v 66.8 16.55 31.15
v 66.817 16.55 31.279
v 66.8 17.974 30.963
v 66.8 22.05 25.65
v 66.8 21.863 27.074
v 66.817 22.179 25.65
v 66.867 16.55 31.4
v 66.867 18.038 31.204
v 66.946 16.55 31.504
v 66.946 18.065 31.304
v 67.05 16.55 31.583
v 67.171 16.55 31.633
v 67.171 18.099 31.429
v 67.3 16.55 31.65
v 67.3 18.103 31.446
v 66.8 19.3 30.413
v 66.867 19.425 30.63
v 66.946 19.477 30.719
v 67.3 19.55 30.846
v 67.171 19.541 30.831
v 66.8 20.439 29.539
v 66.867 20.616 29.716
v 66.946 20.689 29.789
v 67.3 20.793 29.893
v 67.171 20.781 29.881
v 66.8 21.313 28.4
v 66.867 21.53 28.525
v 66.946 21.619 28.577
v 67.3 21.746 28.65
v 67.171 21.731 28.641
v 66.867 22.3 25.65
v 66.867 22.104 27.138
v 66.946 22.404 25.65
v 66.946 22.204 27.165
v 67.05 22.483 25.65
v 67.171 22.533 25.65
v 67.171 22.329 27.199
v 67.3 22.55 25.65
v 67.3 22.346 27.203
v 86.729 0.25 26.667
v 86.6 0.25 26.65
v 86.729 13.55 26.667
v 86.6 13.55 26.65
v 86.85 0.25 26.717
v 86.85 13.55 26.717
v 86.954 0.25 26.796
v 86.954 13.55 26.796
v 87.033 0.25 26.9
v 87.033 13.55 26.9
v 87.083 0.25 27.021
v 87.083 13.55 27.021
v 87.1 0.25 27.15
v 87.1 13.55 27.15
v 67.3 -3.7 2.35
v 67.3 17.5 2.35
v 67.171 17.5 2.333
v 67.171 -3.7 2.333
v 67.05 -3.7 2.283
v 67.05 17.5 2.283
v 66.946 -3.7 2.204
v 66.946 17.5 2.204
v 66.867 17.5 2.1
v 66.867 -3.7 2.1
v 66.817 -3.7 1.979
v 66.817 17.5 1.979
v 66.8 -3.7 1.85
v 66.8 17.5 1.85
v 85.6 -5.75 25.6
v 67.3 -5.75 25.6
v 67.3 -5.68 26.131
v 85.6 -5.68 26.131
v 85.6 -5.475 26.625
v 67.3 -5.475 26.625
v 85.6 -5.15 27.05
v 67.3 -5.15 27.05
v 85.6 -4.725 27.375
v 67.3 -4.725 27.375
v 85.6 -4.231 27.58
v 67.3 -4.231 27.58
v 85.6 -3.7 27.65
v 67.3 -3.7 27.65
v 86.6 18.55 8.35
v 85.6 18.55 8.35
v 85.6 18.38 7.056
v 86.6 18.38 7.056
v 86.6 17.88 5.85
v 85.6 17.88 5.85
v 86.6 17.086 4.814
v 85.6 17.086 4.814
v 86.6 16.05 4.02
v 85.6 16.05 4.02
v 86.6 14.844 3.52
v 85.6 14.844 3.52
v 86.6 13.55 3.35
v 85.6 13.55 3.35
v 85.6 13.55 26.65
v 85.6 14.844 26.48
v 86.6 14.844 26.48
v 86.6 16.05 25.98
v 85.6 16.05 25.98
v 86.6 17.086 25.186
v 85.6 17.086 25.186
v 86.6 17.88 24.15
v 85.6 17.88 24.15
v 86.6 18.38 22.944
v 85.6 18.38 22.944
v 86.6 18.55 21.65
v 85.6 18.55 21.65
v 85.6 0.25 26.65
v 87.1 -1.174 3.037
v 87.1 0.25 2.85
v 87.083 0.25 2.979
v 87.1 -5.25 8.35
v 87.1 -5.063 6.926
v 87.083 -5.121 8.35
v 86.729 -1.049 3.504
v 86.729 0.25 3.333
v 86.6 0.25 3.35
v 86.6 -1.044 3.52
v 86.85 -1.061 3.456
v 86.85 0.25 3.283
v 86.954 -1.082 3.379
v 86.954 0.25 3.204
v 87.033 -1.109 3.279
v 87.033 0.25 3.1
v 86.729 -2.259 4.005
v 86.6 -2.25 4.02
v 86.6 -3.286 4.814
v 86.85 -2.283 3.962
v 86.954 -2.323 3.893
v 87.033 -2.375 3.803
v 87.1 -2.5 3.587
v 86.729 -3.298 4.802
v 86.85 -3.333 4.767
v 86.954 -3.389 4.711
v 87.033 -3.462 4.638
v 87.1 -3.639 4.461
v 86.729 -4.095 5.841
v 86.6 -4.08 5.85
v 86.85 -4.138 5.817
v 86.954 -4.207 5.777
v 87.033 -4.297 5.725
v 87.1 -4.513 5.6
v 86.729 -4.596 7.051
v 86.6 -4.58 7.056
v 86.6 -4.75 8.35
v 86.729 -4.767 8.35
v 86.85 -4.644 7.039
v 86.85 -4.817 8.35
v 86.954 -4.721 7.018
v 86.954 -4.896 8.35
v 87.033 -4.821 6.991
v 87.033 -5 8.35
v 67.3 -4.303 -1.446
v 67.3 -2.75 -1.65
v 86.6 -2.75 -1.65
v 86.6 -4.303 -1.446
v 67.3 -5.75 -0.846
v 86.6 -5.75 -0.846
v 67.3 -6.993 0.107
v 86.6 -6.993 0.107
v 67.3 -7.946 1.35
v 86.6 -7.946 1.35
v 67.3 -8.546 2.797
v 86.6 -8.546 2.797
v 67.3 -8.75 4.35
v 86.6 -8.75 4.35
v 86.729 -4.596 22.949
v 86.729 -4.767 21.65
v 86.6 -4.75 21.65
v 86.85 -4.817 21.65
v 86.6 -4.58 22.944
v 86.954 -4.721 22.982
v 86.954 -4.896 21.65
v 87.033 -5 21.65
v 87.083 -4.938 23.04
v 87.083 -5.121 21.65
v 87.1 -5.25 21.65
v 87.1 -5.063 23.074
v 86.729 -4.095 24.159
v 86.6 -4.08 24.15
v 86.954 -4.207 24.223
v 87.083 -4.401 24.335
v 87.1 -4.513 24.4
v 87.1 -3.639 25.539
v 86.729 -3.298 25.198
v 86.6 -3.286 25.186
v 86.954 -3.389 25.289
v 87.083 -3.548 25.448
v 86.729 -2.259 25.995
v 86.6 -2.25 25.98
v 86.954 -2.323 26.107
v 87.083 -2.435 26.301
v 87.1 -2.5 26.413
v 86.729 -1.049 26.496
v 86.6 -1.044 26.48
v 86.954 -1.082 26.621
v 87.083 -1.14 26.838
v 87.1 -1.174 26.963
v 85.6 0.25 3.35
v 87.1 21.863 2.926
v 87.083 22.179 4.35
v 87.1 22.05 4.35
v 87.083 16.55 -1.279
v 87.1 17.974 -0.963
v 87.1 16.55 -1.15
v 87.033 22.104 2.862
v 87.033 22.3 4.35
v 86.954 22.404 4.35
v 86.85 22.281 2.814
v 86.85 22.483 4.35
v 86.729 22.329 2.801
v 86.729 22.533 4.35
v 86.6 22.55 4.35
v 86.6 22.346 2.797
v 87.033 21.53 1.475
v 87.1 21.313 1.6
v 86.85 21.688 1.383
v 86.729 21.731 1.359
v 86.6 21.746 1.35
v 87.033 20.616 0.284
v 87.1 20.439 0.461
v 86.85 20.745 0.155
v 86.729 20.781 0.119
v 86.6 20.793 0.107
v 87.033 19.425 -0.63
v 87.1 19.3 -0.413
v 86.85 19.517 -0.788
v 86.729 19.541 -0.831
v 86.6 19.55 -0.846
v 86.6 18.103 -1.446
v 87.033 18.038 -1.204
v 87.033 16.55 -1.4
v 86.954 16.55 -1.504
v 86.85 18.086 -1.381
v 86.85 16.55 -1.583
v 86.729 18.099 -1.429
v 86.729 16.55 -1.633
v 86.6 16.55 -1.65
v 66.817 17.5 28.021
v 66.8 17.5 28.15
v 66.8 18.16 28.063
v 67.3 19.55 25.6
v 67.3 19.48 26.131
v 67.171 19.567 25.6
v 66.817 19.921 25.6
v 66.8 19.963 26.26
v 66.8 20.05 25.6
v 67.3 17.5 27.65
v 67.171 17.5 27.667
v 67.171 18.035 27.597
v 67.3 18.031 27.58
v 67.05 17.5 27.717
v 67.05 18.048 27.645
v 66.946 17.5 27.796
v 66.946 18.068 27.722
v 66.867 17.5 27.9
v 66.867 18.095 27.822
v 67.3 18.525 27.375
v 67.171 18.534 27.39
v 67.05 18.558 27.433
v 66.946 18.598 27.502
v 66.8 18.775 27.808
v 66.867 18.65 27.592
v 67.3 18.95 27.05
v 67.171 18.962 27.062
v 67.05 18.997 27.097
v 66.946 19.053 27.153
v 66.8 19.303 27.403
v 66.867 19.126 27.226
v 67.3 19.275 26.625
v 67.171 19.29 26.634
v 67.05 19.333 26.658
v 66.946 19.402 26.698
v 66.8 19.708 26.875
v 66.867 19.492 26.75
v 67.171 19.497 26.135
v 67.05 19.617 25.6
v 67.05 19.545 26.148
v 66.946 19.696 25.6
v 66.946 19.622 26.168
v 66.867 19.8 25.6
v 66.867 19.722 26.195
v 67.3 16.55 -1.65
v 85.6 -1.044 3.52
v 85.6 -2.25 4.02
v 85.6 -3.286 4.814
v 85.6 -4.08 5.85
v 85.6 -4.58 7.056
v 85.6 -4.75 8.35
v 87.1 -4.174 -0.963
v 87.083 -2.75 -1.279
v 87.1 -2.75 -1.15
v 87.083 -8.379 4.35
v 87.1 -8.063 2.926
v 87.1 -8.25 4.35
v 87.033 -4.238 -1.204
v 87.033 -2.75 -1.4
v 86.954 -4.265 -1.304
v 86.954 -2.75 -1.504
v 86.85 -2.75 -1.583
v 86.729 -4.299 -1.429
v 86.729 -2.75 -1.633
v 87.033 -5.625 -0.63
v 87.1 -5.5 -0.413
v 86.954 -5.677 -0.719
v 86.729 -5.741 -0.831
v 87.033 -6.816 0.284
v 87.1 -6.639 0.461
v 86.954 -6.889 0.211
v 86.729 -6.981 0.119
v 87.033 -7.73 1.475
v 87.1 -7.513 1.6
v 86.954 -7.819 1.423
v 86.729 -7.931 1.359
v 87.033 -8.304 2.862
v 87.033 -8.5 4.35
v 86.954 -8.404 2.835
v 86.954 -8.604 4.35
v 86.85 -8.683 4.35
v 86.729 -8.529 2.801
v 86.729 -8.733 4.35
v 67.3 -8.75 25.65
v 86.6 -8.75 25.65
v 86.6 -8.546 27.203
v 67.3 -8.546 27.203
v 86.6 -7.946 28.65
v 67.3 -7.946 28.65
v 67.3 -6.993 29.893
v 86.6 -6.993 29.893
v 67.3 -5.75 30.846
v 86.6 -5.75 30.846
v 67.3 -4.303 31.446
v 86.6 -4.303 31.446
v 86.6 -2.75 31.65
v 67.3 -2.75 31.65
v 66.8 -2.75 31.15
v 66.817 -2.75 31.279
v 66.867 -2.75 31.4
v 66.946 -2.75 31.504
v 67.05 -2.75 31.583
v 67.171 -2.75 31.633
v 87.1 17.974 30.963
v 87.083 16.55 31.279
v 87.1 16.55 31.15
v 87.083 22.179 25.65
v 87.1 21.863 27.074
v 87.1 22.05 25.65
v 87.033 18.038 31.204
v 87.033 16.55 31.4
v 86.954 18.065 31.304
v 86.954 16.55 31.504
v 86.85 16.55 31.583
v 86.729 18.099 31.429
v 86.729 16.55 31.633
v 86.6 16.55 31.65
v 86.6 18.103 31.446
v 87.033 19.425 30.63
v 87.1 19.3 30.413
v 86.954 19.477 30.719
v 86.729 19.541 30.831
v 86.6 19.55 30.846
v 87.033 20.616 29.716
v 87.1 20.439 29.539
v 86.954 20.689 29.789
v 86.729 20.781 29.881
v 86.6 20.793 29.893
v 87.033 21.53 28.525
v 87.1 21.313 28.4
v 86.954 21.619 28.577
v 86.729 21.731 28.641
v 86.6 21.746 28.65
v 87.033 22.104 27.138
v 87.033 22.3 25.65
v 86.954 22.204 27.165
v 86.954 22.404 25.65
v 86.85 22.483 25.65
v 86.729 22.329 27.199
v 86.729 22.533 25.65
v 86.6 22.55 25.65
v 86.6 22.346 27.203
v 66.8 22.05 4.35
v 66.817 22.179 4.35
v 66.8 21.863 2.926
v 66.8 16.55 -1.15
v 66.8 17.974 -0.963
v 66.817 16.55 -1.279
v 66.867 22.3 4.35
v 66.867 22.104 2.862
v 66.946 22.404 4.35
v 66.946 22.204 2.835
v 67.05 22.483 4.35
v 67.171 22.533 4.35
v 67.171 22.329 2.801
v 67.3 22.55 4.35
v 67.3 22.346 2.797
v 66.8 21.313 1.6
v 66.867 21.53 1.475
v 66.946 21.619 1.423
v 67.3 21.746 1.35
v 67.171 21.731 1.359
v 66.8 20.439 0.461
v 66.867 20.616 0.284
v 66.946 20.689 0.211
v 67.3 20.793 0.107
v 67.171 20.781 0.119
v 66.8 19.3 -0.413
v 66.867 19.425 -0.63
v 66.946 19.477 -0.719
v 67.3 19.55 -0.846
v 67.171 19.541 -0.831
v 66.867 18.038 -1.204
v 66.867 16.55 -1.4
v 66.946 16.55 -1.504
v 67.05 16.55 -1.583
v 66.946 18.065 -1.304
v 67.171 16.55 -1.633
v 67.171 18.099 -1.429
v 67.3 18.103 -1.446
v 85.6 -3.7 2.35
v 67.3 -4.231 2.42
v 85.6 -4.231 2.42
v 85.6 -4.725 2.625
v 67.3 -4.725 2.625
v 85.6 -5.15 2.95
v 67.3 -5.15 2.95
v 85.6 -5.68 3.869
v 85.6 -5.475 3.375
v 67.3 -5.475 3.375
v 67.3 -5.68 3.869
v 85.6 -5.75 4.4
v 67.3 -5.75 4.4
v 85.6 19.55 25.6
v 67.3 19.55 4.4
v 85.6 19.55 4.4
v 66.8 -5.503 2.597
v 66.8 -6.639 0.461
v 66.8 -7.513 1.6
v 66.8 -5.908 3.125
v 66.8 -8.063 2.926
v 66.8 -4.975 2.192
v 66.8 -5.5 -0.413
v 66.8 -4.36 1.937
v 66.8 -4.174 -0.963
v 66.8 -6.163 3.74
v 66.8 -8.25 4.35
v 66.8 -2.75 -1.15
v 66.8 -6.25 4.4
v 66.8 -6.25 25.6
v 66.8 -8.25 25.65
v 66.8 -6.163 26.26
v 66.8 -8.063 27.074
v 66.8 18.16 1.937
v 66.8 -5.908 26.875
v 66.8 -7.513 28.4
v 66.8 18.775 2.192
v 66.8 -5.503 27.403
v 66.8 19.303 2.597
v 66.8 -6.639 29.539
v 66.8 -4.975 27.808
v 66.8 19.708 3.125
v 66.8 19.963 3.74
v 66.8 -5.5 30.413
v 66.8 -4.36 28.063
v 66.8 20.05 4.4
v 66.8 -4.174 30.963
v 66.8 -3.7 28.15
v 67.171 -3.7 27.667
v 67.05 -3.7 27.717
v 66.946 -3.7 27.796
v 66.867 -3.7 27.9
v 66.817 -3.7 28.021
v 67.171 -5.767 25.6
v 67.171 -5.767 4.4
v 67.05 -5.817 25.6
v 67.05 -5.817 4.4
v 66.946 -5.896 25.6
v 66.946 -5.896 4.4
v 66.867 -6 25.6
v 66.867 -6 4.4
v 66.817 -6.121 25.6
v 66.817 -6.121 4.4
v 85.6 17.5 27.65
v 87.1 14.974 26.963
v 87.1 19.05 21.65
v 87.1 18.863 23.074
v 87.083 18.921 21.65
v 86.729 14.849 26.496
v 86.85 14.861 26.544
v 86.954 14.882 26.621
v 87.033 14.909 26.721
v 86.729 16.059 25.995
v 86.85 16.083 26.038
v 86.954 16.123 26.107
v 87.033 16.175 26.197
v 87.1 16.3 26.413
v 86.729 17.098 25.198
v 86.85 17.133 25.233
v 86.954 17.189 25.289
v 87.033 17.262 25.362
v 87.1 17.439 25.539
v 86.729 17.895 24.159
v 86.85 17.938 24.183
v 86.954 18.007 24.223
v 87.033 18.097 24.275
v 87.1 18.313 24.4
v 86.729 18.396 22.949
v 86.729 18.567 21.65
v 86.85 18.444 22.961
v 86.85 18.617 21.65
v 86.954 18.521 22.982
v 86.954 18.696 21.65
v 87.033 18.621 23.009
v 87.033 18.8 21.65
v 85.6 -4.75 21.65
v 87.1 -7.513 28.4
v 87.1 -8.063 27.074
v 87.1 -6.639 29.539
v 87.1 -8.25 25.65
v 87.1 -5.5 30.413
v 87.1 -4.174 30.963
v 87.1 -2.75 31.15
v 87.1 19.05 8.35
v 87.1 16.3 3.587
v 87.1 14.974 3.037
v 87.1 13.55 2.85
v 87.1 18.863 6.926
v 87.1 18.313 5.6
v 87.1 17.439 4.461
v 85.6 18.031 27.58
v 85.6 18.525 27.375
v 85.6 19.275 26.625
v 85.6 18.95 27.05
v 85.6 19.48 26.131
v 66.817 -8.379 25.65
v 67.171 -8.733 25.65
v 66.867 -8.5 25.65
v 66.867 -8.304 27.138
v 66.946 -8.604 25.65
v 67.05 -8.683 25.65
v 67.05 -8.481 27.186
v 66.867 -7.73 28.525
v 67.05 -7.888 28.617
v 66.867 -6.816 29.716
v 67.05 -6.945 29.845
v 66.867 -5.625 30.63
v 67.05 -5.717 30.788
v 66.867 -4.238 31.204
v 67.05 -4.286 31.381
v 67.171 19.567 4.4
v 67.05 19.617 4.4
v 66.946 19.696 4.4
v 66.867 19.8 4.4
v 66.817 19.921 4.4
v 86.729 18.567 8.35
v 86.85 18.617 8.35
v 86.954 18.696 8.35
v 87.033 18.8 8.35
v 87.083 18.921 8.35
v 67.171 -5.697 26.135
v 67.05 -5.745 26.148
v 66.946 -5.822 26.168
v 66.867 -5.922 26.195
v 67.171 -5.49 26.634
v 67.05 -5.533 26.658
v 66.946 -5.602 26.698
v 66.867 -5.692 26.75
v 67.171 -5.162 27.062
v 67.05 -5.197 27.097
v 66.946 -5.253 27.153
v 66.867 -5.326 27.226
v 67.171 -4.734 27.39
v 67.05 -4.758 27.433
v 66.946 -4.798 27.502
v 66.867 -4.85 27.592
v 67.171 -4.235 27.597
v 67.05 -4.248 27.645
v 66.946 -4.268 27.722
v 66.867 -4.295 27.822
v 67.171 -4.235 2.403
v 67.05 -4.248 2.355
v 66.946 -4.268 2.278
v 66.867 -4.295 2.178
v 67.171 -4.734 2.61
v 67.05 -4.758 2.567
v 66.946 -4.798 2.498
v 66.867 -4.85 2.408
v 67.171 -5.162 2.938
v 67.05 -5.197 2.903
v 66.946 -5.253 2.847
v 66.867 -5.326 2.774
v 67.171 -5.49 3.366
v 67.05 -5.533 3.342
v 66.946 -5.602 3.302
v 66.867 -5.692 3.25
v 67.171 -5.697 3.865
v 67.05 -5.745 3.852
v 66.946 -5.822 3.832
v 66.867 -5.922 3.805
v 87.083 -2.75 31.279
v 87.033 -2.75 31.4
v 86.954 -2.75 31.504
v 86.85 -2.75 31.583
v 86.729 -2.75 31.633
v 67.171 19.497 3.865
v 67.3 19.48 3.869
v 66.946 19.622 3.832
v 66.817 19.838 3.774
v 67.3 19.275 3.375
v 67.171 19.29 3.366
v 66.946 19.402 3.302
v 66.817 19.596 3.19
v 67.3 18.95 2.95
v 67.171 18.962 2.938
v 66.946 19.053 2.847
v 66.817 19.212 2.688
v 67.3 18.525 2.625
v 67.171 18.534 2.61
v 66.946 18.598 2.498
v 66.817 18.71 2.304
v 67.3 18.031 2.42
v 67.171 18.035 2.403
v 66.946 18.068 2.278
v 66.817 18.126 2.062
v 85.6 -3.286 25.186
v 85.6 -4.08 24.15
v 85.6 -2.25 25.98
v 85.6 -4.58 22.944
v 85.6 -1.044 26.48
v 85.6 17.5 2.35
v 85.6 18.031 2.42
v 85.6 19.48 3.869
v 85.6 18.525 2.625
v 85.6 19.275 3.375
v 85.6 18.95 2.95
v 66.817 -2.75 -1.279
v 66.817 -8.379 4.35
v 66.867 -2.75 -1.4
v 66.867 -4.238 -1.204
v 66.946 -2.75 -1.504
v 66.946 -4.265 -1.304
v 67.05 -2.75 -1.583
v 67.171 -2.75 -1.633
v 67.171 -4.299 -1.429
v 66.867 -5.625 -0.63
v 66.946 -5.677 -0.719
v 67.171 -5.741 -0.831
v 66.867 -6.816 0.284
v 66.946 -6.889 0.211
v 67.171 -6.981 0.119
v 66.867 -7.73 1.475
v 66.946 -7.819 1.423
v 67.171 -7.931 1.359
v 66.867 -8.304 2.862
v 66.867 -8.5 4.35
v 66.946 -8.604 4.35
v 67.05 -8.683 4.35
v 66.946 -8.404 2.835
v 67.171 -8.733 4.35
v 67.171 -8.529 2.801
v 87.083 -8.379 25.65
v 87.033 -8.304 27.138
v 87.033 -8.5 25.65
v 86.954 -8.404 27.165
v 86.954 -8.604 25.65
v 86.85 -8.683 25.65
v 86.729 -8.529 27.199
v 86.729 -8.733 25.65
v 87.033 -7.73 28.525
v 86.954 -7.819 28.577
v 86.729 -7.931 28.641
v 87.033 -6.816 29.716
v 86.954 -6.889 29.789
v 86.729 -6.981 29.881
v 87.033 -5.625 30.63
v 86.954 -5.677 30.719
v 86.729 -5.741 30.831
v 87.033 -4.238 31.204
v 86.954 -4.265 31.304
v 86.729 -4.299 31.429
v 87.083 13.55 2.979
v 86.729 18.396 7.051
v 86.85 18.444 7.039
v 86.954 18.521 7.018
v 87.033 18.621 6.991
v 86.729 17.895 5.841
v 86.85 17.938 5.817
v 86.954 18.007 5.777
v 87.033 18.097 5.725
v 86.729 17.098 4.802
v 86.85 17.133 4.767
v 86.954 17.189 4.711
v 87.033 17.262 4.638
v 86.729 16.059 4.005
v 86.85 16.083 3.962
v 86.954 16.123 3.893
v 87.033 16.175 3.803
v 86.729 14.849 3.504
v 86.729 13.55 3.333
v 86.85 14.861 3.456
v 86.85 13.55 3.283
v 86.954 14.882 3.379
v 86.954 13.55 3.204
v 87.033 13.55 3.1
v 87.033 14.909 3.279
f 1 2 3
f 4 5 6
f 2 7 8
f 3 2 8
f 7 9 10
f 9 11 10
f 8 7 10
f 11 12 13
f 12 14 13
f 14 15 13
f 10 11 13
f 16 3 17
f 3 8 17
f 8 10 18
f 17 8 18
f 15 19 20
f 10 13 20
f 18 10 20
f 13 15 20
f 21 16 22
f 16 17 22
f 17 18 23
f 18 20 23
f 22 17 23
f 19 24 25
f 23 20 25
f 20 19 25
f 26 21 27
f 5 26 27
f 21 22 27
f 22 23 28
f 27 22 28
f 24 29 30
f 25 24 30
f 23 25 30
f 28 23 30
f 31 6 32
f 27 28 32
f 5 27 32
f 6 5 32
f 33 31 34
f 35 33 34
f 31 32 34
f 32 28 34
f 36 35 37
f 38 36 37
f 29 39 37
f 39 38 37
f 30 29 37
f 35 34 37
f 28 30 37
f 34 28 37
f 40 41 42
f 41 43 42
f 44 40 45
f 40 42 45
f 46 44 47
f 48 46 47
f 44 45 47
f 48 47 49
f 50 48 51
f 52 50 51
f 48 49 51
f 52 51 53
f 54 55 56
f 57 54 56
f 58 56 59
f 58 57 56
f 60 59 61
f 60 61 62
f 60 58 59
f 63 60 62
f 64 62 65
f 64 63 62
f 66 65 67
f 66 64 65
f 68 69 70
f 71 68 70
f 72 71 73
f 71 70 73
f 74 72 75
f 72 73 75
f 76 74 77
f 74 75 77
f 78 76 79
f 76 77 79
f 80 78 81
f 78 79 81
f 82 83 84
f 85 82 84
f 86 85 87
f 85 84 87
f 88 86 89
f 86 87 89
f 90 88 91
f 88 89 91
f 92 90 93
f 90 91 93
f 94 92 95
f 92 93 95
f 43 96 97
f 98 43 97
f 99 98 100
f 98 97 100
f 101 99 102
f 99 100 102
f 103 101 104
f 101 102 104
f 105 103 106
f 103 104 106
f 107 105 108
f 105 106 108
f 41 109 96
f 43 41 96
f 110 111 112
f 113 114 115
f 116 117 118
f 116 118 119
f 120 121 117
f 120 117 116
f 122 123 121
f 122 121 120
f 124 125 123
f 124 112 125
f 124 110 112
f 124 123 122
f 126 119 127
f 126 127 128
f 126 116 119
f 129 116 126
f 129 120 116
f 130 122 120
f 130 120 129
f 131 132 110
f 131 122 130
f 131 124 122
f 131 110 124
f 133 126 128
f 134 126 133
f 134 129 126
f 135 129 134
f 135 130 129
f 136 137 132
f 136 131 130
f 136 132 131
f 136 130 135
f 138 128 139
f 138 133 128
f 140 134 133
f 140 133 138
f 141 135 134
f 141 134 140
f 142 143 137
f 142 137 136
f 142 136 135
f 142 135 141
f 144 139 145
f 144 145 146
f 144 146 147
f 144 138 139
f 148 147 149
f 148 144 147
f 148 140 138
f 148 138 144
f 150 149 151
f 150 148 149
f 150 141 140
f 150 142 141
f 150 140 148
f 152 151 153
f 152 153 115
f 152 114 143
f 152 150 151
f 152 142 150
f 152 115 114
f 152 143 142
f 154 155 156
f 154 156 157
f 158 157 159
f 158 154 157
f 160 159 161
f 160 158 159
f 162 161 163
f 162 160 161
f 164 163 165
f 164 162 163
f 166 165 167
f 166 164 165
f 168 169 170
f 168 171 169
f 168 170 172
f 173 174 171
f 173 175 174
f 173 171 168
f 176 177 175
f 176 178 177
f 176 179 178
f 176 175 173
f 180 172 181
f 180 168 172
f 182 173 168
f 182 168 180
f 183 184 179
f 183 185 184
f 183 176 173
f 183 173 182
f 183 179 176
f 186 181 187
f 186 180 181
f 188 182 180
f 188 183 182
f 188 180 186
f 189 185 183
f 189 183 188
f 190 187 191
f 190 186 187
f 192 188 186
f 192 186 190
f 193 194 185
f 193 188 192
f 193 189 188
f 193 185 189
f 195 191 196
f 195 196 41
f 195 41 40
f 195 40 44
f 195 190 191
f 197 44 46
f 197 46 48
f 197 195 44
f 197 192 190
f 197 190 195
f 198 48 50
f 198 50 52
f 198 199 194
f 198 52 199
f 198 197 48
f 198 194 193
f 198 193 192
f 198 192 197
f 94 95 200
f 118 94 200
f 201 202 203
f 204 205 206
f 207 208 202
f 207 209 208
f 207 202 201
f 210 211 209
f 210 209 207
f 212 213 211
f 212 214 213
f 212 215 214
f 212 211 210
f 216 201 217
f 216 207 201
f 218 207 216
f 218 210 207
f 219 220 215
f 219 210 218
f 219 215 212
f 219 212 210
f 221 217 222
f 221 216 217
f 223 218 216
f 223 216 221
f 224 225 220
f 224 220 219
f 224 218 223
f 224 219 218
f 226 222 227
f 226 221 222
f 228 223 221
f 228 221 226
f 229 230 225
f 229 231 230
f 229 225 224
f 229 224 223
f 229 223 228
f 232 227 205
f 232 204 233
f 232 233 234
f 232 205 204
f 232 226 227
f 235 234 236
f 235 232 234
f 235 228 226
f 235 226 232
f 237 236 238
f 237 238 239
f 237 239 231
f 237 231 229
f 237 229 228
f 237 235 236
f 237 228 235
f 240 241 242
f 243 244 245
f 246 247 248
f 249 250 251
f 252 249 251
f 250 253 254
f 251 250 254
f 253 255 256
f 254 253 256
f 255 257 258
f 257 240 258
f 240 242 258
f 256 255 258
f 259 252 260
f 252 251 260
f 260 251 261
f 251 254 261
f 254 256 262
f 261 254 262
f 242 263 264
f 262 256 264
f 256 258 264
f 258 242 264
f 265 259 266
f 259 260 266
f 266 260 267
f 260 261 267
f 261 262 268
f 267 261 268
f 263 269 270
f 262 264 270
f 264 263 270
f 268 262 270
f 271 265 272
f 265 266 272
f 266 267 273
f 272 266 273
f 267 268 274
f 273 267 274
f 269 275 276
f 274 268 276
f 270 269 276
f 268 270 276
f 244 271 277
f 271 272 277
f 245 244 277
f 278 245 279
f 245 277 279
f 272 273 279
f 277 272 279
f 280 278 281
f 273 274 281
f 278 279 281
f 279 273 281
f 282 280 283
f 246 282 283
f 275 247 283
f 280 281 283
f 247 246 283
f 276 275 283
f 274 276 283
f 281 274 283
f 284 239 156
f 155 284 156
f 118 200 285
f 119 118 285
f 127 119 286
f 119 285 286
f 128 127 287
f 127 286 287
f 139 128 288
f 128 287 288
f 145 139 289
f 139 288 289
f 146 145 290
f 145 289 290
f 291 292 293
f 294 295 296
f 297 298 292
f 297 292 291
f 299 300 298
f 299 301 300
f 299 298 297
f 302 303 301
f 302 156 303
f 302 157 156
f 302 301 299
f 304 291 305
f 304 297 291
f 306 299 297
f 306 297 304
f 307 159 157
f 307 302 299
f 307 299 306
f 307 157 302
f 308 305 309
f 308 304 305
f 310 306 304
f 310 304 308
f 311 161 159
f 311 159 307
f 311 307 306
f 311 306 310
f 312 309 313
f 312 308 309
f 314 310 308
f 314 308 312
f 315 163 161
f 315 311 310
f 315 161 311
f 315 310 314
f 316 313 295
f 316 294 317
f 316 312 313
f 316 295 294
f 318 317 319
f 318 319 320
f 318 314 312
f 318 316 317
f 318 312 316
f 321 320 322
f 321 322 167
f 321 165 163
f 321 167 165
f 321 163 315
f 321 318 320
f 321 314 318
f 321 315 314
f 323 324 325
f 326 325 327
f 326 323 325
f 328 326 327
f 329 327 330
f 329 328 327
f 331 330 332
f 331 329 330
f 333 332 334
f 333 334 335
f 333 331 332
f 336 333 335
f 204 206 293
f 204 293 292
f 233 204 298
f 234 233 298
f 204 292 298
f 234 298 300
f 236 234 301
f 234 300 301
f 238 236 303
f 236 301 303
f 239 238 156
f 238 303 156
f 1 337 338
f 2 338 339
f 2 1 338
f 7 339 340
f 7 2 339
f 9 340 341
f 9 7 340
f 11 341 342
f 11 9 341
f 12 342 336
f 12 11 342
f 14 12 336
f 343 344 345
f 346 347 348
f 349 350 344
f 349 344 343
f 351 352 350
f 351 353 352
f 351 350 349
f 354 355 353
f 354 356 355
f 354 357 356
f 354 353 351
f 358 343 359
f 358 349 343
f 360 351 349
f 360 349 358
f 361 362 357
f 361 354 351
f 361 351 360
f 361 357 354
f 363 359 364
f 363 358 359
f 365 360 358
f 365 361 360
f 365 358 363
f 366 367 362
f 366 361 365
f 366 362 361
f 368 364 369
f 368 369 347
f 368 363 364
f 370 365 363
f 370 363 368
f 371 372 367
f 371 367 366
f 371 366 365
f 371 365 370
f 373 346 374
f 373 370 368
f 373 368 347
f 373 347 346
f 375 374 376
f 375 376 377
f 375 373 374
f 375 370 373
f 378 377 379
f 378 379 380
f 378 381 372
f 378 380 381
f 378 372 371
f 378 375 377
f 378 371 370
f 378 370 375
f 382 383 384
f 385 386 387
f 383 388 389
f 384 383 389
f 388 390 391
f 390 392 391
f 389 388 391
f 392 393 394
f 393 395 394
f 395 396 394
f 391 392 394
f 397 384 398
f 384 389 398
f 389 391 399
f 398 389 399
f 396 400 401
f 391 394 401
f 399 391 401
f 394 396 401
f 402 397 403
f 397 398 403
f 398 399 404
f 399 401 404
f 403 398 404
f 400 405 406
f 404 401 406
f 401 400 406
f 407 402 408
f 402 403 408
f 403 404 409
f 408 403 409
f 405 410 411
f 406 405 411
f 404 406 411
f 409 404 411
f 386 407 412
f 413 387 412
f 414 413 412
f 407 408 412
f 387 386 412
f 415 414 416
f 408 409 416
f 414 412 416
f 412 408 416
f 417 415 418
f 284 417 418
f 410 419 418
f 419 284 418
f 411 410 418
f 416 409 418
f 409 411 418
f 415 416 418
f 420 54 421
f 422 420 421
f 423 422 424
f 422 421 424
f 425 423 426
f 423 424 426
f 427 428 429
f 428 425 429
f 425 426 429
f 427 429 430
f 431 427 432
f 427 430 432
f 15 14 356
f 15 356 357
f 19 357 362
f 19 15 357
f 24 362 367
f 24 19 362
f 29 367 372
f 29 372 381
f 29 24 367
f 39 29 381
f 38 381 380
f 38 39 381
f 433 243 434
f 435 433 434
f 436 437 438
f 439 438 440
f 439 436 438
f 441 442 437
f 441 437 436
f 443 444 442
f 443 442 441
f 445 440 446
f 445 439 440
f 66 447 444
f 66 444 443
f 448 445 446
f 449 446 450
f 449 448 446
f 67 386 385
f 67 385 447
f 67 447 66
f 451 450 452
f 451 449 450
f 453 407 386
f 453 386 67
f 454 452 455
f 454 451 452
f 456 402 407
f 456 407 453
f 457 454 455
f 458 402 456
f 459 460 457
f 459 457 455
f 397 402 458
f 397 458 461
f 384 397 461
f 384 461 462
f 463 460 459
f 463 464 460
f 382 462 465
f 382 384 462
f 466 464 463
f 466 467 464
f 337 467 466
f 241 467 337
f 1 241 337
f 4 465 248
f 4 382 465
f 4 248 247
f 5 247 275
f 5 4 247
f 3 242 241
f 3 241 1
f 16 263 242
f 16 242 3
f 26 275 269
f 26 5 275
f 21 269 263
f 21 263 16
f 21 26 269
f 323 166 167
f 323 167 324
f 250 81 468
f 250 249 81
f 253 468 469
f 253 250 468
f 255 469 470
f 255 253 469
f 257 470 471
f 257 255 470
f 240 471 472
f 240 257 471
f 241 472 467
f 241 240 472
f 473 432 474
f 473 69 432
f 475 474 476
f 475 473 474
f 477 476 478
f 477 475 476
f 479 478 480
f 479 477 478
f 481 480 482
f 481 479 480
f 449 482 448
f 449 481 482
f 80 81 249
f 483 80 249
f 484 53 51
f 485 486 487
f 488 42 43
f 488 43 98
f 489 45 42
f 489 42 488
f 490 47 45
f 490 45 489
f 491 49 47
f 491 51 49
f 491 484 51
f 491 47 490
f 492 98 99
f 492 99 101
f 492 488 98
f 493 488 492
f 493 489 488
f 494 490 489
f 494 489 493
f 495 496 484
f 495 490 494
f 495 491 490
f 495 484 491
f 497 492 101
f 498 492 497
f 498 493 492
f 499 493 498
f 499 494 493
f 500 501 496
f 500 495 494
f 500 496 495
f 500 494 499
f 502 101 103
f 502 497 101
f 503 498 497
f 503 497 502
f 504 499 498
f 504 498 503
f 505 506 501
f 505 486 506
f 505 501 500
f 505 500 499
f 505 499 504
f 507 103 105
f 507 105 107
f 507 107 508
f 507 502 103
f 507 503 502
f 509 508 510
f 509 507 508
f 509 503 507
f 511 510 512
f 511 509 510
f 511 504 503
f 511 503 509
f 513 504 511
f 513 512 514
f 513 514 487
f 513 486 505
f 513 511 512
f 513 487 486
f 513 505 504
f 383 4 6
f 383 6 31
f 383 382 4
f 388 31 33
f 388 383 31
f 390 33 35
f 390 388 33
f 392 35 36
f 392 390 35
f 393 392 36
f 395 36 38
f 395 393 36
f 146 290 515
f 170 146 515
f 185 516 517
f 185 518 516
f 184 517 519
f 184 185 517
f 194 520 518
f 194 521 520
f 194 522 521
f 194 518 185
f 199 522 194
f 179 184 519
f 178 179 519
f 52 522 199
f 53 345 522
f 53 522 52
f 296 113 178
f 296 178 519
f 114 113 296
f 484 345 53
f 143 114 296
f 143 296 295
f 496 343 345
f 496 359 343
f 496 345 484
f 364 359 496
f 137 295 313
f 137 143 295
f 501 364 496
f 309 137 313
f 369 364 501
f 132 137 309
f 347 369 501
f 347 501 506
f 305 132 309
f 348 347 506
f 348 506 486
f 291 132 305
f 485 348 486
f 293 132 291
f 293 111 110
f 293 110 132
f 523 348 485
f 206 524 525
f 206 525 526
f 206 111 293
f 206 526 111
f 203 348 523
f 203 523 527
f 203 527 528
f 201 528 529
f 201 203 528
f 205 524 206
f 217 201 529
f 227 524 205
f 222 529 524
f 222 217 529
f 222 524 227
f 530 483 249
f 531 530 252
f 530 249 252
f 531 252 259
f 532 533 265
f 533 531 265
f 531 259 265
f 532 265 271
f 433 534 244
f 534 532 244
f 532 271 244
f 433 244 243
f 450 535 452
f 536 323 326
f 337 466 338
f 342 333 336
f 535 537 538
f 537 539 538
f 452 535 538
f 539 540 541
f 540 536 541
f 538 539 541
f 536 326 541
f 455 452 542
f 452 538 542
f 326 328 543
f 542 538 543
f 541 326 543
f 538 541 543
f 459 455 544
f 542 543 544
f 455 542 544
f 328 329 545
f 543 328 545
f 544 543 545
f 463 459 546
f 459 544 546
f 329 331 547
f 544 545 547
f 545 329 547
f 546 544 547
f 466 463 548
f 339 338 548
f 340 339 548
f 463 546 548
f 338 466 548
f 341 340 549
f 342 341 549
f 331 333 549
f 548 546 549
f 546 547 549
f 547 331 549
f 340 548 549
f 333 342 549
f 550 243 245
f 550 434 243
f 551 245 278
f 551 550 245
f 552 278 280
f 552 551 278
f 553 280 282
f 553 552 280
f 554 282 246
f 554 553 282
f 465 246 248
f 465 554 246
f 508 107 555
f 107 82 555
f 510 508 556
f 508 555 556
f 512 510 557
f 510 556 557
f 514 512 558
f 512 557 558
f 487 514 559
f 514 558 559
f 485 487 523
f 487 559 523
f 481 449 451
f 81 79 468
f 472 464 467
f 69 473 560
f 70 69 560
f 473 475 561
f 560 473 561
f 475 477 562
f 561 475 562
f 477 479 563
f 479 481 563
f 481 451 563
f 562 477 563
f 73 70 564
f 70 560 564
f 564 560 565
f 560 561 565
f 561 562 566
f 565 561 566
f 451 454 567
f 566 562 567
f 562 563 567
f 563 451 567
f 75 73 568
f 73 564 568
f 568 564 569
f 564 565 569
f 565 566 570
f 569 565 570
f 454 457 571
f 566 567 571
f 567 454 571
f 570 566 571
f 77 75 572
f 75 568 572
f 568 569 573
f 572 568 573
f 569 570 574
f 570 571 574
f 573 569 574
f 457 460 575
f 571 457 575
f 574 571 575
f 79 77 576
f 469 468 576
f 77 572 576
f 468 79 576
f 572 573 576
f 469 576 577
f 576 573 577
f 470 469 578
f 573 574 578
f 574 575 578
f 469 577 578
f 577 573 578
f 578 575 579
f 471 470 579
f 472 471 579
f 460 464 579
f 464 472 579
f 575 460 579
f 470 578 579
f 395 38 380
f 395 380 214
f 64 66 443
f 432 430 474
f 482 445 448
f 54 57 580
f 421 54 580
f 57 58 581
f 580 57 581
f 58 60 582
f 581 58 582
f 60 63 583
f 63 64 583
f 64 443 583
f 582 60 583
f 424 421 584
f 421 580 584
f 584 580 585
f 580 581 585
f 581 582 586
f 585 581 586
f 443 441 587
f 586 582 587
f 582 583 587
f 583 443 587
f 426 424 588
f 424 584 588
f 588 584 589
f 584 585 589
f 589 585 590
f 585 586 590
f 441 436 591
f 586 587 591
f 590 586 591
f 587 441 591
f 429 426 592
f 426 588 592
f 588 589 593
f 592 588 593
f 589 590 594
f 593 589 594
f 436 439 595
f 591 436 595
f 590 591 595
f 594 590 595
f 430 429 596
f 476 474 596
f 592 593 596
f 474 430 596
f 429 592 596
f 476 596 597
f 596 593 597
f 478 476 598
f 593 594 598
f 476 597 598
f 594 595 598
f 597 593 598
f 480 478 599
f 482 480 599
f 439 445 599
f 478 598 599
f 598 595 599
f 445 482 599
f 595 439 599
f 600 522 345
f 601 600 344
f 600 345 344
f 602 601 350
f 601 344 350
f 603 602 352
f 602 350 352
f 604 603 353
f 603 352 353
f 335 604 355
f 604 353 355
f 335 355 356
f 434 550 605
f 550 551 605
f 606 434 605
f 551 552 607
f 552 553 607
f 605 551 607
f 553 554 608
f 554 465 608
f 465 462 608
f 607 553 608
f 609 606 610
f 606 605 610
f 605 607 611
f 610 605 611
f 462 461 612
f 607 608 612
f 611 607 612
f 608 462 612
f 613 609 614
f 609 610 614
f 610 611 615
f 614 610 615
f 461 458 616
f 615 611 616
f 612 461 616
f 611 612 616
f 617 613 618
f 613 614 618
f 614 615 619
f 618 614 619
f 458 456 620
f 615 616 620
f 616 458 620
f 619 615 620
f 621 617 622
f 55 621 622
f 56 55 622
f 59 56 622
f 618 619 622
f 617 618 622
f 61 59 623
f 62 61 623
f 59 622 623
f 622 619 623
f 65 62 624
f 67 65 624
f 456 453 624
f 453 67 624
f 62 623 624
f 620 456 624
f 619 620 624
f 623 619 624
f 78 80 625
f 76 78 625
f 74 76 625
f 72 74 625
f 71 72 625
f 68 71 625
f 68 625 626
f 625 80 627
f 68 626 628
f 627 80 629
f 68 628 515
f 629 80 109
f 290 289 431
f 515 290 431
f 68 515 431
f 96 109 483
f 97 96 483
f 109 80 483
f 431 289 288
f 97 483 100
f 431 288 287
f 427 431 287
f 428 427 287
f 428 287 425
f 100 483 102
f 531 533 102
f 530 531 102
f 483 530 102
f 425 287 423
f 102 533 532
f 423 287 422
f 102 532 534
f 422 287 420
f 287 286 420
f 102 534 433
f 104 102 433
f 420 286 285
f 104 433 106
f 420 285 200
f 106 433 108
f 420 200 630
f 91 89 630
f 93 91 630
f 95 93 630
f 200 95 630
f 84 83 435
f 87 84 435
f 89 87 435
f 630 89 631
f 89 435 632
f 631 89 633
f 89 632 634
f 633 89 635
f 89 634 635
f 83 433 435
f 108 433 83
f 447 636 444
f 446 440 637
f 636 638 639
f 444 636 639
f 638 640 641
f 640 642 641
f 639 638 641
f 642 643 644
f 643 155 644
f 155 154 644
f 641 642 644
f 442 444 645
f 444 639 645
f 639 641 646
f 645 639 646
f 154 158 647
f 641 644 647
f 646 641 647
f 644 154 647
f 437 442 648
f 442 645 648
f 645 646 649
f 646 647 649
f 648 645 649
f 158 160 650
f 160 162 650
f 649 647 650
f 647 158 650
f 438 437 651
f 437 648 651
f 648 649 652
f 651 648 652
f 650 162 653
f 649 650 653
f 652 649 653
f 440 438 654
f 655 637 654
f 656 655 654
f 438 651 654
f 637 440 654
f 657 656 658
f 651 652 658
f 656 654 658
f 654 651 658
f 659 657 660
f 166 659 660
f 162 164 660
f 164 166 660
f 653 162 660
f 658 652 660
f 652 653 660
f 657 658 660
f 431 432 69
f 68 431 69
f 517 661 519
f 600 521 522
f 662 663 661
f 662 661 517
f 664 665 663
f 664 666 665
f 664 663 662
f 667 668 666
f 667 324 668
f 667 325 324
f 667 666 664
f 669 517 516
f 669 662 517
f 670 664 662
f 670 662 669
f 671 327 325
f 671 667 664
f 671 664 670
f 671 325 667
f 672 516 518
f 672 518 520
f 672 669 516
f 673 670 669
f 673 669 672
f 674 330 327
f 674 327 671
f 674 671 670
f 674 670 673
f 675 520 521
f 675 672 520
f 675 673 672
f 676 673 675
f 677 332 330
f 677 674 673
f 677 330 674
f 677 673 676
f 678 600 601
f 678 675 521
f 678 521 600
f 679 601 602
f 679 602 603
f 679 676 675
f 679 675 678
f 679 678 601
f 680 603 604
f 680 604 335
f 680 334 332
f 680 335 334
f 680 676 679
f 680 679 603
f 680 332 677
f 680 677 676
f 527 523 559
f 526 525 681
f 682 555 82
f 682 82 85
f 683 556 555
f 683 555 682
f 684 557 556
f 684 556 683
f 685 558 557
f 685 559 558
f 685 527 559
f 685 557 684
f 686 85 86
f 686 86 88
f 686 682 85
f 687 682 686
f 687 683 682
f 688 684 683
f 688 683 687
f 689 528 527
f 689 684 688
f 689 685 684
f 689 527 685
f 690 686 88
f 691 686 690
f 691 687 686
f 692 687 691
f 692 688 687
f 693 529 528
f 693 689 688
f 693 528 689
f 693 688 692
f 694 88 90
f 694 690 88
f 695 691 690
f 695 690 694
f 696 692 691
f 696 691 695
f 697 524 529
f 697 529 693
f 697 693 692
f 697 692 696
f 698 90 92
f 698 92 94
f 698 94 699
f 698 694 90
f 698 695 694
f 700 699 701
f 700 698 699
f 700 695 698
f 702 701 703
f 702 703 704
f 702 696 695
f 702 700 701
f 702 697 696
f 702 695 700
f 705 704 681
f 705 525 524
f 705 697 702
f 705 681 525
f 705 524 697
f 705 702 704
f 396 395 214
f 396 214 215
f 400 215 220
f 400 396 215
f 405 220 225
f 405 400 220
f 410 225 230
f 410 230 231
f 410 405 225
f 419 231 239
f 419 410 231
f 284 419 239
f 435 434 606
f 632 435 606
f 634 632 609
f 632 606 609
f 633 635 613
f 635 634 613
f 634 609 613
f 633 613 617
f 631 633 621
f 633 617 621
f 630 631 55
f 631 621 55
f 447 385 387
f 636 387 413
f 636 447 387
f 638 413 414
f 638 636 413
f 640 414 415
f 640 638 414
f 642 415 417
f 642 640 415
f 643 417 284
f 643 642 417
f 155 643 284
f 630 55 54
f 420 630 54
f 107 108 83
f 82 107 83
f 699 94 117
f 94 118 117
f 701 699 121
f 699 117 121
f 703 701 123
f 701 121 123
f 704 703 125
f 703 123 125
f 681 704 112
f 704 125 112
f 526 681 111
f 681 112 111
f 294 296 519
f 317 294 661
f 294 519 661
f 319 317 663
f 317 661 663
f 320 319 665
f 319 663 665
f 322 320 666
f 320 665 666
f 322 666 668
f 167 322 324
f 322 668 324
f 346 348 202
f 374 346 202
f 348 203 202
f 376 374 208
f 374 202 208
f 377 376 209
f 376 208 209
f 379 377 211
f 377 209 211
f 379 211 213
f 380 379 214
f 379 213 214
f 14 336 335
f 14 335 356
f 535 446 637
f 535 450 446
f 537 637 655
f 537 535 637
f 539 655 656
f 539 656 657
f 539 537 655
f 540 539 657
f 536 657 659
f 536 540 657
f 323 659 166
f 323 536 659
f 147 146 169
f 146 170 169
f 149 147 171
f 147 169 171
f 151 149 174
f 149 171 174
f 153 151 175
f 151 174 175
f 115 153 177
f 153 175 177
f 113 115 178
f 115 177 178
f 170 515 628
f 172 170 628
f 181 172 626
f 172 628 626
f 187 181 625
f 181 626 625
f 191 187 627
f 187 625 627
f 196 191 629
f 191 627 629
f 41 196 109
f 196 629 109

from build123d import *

# Parameters (mm, degrees)
BOSS_EXTRUDE1_DEPTH      = 14.5
BOSS_EXTRUDE1_DEPTH_BACK = 5.8
BOSS_EXTRUDE2_START      = 13
BOSS_EXTRUDE2_DEPTH      = 1.5
FILLET1_R                = 0.5


with BuildPart() as part:
    # Sketch1 → Boss-Extrude1 (new, two sides: drawn at the far end of the back side and taken through both)
    with BuildSketch(Plane(origin=(72.6, 0, 0), x_dir=(0, 0, -1), z_dir=(1, 0, 0)).offset(-BOSS_EXTRUDE1_DEPTH_BACK)):
        with BuildLine():
            Line((-25.65, 22.55), (-4.35, 22.55))
            ThreePointArc((-4.35, 22.55), (-0.107359313, 20.792640687), (1.65, 16.55))
            Line((1.65, 16.55), (1.65, -2.75))
            ThreePointArc((1.65, -2.75), (-0.107359313, -6.992640687), (-4.35, -8.75))
            Line((-4.35, -8.75), (-25.65, -8.75))
            ThreePointArc((-25.65, -8.75), (-29.892640687, -6.992640687), (-31.65, -2.75))
            Line((-31.65, -2.75), (-31.65, 16.55))
            ThreePointArc((-31.65, 16.55), (-29.892640687, 20.792640687), (-25.65, 22.55))
        make_face()
        with BuildLine():
            Line((-25.6, 19.55), (-4.4, 19.55))
            ThreePointArc((-4.4, 19.55), (-2.950431099, 18.949568901), (-2.35, 17.5))
            Line((-2.35, 17.5), (-2.35, -3.7))
            ThreePointArc((-2.35, -3.7), (-2.950431099, -5.149568901), (-4.4, -5.75))
            Line((-4.4, -5.75), (-25.6, -5.75))
            ThreePointArc((-25.6, -5.75), (-27.049568901, -5.149568901), (-27.65, -3.7))
            Line((-27.65, -3.7), (-27.65, 17.5))
            ThreePointArc((-27.65, 17.5), (-27.049568901, 18.949568901), (-25.6, 19.55))
        make_face(mode=Mode.SUBTRACT)
    extrude(amount=BOSS_EXTRUDE1_DEPTH + BOSS_EXTRUDE1_DEPTH_BACK)

    # Sketch1<4> → Boss-Extrude2 (add)
    with BuildSketch(Plane(origin=(72.6, 0, 0), x_dir=(0, 0, -1), z_dir=(1, 0, 0)).offset(BOSS_EXTRUDE2_START)):
        with BuildLine():
            Line((-4.4, 19.55), (-25.6, 19.55))
            ThreePointArc((-25.6, 19.55), (-27.049568901, 18.949568901), (-27.65, 17.5))
            Line((-27.65, 17.5), (-27.65, -3.7))
            ThreePointArc((-27.65, -3.7), (-27.049568901, -5.149568901), (-25.6, -5.75))
            Line((-25.6, -5.75), (-4.4, -5.75))
            ThreePointArc((-4.4, -5.75), (-2.950431099, -5.149568901), (-2.35, -3.7))
            Line((-2.35, -3.7), (-2.35, 17.5))
            ThreePointArc((-2.35, 17.5), (-2.950431099, 18.949568901), (-4.4, 19.55))
        make_face()
        with BuildLine():
            ThreePointArc((-26.65, 13.55), (-25.185533906, 17.085533906), (-21.65, 18.55))
            Line((-21.65, 18.55), (-8.35, 18.55))
            ThreePointArc((-8.35, 18.55), (-4.814466094, 17.085533906), (-3.35, 13.55))
            Line((-3.35, 13.55), (-3.35, 0.25))
            ThreePointArc((-3.35, 0.25), (-4.814466094, -3.285533906), (-8.35, -4.75))
            Line((-8.35, -4.75), (-21.65, -4.75))
            ThreePointArc((-21.65, -4.75), (-25.185533906, -3.285533906), (-26.65, 0.25))
            Line((-26.65, 0.25), (-26.65, 13.55))
        make_face(mode=Mode.SUBTRACT)
    extrude(amount=BOSS_EXTRUDE2_DEPTH)

    # Fillet1
    fillet1_edges = [part.edges().sort_by_distance(p)[0] for p in [
        (66.8, -6.992640687, 29.892640687),
        (66.8, 6.9, 2.35),
        (66.8, 19.55, 15),
        (66.8, 6.9, -1.65),
        (66.8, 18.949568901, 27.049568901),
        (66.8, 6.9, 27.65),
        (87.1, 6.9, -1.65),
        (87.1, 22.55, 15),
        (66.8, -5.149568901, 27.049568901),
        (87.1, 20.792640687, 29.892640687),
        (87.1, 6.9, 31.65),
        (87.1, -6.992640687, 29.892640687),
        (87.1, -8.75, 15),
        (87.1, -6.992640687, 0.107359313),
        (87.1, 20.792640687, 0.107359313),
        (66.8, -5.75, 15),
        (66.8, -5.149568901, 2.950431099),
        (66.8, 18.949568901, 2.950431099),
        (87.1, 6.9, 26.65),
        (87.1, -4.75, 15),
        (87.1, 17.085533906, 25.185533906),
        (87.1, 18.55, 15),
        (87.1, 17.085533906, 4.814466094),
        (87.1, 6.9, 3.35),
        (87.1, -3.285533906, 4.814466094),
        (87.1, -3.285533906, 25.185533906),
        (66.8, 22.55, 15),
        (66.8, 6.9, 31.65),
        (66.8, 20.792640687, 29.892640687),
        (66.8, 20.792640687, 0.107359313),
        (66.8, -6.992640687, 0.107359313),
        (66.8, -8.75, 15),
    ]]
    fillet(fillet1_edges, radius=FILLET1_R)


solid = part.part
